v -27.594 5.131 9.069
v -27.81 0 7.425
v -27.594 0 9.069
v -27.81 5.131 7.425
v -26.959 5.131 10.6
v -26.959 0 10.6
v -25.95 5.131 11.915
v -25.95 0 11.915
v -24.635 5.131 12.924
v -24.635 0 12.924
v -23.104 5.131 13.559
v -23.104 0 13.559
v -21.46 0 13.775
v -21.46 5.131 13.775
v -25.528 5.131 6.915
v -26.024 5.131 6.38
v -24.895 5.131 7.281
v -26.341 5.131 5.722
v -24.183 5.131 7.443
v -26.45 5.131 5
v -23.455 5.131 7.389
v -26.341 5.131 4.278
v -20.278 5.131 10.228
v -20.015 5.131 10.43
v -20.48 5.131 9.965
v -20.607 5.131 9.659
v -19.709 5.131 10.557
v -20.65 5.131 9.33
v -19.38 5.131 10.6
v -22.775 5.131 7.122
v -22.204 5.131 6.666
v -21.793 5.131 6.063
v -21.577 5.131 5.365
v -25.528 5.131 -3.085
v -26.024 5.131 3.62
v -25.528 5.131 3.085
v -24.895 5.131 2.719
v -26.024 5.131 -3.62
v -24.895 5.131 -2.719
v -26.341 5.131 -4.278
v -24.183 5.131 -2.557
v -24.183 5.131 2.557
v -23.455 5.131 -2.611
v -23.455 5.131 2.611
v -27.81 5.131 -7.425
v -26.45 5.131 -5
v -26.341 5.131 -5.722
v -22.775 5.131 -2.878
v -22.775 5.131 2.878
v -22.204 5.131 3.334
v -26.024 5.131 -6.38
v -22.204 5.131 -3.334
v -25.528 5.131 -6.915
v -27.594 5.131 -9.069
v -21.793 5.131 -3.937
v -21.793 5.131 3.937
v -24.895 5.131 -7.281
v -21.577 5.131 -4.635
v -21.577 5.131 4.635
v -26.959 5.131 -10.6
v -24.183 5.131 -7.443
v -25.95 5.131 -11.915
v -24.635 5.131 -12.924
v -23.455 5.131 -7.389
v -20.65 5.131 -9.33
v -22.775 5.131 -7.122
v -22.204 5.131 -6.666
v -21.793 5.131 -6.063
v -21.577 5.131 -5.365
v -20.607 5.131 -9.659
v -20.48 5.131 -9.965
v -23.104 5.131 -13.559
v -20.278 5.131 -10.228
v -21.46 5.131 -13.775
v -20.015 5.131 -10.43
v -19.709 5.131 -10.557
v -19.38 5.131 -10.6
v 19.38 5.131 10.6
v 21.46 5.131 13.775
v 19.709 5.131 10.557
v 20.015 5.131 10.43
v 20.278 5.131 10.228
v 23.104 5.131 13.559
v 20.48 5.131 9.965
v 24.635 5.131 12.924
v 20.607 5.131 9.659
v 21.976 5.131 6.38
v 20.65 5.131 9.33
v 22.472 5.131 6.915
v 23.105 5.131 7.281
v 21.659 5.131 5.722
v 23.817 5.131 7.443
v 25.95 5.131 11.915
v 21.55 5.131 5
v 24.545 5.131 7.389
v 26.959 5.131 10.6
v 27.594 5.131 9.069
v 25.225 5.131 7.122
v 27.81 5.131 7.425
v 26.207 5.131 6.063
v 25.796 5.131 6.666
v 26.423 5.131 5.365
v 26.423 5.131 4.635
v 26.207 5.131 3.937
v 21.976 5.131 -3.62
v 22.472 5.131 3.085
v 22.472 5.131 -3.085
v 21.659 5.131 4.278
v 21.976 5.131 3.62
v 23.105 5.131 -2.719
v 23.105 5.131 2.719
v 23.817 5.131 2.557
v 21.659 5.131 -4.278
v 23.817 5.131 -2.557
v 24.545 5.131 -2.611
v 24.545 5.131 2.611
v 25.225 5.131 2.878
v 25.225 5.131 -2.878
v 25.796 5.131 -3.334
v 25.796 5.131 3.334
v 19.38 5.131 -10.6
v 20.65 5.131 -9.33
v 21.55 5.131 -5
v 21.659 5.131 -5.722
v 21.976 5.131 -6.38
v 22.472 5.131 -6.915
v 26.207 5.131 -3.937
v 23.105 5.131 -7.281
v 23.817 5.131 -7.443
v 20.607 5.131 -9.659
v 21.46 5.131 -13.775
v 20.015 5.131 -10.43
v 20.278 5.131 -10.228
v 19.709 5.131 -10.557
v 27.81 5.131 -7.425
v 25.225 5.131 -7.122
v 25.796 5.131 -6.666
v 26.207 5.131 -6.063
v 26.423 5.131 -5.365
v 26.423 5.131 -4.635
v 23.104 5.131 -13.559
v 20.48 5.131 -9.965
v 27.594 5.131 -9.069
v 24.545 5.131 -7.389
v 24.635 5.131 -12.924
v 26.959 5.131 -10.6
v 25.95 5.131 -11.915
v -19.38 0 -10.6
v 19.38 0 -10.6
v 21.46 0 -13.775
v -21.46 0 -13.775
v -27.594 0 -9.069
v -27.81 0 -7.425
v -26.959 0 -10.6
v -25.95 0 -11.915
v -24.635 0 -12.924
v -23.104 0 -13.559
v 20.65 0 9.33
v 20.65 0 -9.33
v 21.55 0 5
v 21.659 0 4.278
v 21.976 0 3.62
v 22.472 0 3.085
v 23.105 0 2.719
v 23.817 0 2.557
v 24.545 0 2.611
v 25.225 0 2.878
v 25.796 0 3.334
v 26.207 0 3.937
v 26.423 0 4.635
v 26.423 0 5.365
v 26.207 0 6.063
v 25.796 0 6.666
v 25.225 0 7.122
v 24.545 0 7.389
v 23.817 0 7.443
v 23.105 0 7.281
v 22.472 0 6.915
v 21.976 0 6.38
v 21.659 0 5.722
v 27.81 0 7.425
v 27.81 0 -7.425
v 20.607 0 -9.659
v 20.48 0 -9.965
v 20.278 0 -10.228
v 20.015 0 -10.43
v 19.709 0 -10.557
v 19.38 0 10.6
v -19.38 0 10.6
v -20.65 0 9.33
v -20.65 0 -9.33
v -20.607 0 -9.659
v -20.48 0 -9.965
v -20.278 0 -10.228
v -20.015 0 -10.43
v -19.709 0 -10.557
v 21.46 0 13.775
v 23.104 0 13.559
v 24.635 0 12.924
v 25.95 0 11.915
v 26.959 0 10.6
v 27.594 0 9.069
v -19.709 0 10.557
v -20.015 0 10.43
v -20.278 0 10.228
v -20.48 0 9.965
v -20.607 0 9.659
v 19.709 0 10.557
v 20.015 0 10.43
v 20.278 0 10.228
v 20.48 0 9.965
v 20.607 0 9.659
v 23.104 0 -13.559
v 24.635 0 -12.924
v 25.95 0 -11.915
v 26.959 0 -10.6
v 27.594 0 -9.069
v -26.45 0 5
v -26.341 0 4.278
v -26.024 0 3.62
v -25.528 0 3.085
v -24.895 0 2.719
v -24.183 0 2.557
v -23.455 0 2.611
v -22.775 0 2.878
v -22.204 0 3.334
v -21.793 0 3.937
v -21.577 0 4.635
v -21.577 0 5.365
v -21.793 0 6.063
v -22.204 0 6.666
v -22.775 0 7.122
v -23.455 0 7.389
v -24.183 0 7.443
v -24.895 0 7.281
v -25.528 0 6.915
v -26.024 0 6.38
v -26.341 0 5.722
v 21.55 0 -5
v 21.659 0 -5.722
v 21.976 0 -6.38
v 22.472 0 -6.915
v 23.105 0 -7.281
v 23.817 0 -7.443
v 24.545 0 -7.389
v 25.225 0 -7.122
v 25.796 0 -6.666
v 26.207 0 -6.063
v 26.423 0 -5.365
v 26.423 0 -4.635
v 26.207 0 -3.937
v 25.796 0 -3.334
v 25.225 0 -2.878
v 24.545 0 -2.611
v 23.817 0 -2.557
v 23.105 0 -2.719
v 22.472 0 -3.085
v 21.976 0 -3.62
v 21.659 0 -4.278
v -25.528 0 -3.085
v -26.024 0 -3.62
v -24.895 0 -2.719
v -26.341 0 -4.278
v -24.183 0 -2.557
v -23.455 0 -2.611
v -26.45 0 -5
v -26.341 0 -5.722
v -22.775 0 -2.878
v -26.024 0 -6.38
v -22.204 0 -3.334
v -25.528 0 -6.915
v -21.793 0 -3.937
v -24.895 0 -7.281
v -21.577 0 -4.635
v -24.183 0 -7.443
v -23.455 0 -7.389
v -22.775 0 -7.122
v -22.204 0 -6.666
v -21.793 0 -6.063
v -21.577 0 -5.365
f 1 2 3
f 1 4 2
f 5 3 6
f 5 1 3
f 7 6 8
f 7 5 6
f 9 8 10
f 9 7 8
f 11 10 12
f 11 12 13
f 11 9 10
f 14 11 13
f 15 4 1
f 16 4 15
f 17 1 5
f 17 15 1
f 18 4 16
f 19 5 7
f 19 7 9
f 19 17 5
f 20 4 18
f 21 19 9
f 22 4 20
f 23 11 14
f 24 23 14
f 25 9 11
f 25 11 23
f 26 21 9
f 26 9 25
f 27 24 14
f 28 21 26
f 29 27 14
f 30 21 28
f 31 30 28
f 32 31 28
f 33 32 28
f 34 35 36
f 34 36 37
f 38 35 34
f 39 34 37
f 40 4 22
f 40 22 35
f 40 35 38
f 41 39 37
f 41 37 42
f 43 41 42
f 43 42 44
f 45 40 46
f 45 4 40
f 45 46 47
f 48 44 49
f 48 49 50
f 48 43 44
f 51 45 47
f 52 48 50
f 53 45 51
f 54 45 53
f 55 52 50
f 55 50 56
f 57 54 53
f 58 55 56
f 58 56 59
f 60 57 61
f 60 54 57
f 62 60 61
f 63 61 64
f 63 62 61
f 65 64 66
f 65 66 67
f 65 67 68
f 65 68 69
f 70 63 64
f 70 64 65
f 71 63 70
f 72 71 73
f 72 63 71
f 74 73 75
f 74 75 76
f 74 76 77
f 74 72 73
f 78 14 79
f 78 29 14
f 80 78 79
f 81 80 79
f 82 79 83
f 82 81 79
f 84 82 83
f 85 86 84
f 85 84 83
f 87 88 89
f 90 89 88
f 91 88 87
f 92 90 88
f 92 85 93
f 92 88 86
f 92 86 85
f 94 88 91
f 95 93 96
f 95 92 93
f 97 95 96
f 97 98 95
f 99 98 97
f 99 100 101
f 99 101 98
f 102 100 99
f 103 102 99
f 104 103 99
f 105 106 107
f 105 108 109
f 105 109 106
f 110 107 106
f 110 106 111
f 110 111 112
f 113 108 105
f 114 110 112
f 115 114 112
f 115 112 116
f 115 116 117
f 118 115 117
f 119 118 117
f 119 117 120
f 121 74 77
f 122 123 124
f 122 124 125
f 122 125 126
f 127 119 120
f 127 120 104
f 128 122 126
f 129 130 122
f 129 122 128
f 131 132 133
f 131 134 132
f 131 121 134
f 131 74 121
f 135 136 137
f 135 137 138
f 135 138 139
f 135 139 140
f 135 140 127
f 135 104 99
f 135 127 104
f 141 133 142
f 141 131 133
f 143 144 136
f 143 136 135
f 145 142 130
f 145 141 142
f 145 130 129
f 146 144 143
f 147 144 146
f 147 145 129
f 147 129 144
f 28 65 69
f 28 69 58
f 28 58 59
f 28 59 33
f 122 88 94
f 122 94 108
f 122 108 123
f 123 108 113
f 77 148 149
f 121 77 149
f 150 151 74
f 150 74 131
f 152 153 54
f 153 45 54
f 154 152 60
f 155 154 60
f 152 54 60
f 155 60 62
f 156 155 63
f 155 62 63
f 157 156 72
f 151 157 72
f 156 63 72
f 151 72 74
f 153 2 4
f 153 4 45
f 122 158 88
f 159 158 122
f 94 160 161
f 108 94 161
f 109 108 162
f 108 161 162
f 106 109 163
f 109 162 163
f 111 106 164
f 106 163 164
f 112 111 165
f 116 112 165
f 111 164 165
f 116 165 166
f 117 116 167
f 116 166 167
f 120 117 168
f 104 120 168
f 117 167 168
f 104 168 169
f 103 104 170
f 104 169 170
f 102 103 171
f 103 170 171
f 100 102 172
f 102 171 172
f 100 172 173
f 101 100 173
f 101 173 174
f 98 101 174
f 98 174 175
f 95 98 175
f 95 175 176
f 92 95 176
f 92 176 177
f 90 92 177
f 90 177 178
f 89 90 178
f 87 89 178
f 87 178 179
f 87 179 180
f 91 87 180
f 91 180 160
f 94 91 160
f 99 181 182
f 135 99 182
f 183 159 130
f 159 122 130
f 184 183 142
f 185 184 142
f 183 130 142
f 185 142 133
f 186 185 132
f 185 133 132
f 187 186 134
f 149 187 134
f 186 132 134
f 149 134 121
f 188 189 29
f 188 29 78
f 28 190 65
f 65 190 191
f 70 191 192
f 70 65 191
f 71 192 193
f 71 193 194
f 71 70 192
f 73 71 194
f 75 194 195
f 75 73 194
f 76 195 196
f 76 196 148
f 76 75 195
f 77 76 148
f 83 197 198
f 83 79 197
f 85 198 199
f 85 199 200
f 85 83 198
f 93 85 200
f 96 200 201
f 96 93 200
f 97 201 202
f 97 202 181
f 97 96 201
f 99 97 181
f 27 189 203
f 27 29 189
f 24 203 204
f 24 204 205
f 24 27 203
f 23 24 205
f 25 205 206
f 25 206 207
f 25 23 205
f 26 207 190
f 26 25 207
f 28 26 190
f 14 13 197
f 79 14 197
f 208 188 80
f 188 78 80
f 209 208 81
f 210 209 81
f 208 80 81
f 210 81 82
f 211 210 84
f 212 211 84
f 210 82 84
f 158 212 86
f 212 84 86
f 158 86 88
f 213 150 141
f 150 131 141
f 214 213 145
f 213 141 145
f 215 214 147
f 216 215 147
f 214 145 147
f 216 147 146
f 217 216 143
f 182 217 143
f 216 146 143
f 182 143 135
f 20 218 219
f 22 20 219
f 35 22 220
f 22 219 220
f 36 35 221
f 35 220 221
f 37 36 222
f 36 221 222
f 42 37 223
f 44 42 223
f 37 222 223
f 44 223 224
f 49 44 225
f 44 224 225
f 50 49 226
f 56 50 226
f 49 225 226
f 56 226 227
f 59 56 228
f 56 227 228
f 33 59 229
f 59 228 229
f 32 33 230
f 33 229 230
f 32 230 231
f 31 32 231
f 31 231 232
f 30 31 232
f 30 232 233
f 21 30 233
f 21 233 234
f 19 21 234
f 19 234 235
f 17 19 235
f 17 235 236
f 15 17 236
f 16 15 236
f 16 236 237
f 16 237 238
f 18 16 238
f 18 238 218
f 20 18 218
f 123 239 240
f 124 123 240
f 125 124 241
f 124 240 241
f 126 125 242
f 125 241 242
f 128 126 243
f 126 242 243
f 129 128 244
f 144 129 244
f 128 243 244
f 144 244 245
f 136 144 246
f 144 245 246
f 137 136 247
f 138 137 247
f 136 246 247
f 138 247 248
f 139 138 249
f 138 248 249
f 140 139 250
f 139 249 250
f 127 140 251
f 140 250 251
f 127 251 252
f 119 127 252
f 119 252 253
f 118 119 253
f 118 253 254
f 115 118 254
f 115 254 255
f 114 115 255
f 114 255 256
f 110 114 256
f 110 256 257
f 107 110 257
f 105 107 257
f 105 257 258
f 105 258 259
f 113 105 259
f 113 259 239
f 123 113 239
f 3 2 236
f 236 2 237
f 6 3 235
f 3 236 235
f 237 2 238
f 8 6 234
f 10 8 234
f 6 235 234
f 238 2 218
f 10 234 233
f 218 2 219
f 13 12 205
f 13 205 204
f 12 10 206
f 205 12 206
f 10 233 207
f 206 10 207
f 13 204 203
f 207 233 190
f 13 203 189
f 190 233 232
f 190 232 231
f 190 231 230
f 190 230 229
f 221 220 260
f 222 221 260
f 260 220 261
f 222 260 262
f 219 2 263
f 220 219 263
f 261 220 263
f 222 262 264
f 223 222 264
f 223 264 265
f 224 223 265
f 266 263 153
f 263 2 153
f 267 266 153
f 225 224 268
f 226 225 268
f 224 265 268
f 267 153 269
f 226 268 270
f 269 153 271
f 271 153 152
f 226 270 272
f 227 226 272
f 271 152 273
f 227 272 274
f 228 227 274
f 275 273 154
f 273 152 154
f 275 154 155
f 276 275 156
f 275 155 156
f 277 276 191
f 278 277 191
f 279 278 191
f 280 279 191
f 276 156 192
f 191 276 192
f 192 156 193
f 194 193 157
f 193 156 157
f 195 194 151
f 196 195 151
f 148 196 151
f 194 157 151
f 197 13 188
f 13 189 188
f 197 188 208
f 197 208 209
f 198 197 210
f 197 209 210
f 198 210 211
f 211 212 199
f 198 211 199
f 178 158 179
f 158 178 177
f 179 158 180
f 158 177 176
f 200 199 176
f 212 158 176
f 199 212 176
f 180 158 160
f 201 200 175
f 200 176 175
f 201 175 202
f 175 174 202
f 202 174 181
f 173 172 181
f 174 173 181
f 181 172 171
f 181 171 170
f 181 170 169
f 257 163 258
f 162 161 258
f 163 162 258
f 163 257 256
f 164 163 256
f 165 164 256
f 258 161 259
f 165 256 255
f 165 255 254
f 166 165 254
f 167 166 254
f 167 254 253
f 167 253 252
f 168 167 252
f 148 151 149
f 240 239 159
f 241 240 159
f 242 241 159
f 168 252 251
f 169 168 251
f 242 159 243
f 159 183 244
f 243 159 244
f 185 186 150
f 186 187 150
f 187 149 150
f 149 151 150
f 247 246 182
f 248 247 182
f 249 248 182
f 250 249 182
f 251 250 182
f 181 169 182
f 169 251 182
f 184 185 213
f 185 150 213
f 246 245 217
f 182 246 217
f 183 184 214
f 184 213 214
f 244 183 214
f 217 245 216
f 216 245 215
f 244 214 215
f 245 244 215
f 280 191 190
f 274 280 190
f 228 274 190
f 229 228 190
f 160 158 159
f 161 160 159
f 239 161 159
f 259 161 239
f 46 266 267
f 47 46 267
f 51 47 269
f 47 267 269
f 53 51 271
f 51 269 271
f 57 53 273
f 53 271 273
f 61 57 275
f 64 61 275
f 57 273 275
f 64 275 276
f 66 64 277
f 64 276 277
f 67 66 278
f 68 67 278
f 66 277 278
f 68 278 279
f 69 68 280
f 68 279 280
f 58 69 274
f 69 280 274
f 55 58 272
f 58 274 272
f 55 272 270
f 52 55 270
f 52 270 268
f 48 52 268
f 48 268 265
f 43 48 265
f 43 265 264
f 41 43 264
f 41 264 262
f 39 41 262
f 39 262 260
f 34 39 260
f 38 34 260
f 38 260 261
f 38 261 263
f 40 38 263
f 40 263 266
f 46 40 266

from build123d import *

# Parameters (mm, degrees)
SKETCH1_W                  = 55.620000012
SKETCH1_H                  = 27.550000018
SKETCH1_W_2                = 41.29999995
SKETCH1_H_2                = 21.200000018
BOSS_EXTRUDE1_DEPTH        = 5.1308
F_4_9_4_9_DIAMETER_HOLE1_D = 4.9
FILLET1_R                  = 6.35
FILLET2_R                  = 1.27


with BuildPart() as part:
    # Sketch1 → Boss-Extrude1 (new body)
    with BuildSketch(Plane(origin=(0, 0, 0), x_dir=(1, 0, 0), z_dir=(0, 1, 0))):
        Rectangle(SKETCH1_W, SKETCH1_H)
        Rectangle(SKETCH1_W_2, SKETCH1_H_2, mode=Mode.SUBTRACT)
    extrude(amount=BOSS_EXTRUDE1_DEPTH)

    # Ø4.9 (4.9) Diameter Hole1 (through all)
    with Locations(Plane(origin=(0, 5.1308, 0), x_dir=(1, 0, 0), z_dir=(0, 1, 0))):
        with Locations((24, -5), (-24, 5), (-24, -5), (24, 5)):
            Hole(F_4_9_4_9_DIAMETER_HOLE1_D / 2)

    # Fillet1
    fillet1_edges = [part.edges().sort_by_distance(p)[0] for p in [
        (27.810000006, 2.5654, 13.775000009),
        (-27.810000006, 2.5654, 13.775000009),
        (-27.810000006, 2.5654, -13.775000009),
        (27.810000006, 2.5654, -13.775000009),
    ]]
    fillet(fillet1_edges, radius=FILLET1_R)

    # Fillet2
    fillet2_edges = [part.edges().sort_by_distance(p)[0] for p in [
        (20.649999975, 2.5654, 10.600000009),
        (20.649999975, 2.5654, -10.600000009),
        (-20.649999975, 2.5654, -10.600000009),
        (-20.649999975, 2.5654, 10.600000009),
    ]]
    fillet(fillet2_edges, radius=FILLET2_R)


solid = part.part
